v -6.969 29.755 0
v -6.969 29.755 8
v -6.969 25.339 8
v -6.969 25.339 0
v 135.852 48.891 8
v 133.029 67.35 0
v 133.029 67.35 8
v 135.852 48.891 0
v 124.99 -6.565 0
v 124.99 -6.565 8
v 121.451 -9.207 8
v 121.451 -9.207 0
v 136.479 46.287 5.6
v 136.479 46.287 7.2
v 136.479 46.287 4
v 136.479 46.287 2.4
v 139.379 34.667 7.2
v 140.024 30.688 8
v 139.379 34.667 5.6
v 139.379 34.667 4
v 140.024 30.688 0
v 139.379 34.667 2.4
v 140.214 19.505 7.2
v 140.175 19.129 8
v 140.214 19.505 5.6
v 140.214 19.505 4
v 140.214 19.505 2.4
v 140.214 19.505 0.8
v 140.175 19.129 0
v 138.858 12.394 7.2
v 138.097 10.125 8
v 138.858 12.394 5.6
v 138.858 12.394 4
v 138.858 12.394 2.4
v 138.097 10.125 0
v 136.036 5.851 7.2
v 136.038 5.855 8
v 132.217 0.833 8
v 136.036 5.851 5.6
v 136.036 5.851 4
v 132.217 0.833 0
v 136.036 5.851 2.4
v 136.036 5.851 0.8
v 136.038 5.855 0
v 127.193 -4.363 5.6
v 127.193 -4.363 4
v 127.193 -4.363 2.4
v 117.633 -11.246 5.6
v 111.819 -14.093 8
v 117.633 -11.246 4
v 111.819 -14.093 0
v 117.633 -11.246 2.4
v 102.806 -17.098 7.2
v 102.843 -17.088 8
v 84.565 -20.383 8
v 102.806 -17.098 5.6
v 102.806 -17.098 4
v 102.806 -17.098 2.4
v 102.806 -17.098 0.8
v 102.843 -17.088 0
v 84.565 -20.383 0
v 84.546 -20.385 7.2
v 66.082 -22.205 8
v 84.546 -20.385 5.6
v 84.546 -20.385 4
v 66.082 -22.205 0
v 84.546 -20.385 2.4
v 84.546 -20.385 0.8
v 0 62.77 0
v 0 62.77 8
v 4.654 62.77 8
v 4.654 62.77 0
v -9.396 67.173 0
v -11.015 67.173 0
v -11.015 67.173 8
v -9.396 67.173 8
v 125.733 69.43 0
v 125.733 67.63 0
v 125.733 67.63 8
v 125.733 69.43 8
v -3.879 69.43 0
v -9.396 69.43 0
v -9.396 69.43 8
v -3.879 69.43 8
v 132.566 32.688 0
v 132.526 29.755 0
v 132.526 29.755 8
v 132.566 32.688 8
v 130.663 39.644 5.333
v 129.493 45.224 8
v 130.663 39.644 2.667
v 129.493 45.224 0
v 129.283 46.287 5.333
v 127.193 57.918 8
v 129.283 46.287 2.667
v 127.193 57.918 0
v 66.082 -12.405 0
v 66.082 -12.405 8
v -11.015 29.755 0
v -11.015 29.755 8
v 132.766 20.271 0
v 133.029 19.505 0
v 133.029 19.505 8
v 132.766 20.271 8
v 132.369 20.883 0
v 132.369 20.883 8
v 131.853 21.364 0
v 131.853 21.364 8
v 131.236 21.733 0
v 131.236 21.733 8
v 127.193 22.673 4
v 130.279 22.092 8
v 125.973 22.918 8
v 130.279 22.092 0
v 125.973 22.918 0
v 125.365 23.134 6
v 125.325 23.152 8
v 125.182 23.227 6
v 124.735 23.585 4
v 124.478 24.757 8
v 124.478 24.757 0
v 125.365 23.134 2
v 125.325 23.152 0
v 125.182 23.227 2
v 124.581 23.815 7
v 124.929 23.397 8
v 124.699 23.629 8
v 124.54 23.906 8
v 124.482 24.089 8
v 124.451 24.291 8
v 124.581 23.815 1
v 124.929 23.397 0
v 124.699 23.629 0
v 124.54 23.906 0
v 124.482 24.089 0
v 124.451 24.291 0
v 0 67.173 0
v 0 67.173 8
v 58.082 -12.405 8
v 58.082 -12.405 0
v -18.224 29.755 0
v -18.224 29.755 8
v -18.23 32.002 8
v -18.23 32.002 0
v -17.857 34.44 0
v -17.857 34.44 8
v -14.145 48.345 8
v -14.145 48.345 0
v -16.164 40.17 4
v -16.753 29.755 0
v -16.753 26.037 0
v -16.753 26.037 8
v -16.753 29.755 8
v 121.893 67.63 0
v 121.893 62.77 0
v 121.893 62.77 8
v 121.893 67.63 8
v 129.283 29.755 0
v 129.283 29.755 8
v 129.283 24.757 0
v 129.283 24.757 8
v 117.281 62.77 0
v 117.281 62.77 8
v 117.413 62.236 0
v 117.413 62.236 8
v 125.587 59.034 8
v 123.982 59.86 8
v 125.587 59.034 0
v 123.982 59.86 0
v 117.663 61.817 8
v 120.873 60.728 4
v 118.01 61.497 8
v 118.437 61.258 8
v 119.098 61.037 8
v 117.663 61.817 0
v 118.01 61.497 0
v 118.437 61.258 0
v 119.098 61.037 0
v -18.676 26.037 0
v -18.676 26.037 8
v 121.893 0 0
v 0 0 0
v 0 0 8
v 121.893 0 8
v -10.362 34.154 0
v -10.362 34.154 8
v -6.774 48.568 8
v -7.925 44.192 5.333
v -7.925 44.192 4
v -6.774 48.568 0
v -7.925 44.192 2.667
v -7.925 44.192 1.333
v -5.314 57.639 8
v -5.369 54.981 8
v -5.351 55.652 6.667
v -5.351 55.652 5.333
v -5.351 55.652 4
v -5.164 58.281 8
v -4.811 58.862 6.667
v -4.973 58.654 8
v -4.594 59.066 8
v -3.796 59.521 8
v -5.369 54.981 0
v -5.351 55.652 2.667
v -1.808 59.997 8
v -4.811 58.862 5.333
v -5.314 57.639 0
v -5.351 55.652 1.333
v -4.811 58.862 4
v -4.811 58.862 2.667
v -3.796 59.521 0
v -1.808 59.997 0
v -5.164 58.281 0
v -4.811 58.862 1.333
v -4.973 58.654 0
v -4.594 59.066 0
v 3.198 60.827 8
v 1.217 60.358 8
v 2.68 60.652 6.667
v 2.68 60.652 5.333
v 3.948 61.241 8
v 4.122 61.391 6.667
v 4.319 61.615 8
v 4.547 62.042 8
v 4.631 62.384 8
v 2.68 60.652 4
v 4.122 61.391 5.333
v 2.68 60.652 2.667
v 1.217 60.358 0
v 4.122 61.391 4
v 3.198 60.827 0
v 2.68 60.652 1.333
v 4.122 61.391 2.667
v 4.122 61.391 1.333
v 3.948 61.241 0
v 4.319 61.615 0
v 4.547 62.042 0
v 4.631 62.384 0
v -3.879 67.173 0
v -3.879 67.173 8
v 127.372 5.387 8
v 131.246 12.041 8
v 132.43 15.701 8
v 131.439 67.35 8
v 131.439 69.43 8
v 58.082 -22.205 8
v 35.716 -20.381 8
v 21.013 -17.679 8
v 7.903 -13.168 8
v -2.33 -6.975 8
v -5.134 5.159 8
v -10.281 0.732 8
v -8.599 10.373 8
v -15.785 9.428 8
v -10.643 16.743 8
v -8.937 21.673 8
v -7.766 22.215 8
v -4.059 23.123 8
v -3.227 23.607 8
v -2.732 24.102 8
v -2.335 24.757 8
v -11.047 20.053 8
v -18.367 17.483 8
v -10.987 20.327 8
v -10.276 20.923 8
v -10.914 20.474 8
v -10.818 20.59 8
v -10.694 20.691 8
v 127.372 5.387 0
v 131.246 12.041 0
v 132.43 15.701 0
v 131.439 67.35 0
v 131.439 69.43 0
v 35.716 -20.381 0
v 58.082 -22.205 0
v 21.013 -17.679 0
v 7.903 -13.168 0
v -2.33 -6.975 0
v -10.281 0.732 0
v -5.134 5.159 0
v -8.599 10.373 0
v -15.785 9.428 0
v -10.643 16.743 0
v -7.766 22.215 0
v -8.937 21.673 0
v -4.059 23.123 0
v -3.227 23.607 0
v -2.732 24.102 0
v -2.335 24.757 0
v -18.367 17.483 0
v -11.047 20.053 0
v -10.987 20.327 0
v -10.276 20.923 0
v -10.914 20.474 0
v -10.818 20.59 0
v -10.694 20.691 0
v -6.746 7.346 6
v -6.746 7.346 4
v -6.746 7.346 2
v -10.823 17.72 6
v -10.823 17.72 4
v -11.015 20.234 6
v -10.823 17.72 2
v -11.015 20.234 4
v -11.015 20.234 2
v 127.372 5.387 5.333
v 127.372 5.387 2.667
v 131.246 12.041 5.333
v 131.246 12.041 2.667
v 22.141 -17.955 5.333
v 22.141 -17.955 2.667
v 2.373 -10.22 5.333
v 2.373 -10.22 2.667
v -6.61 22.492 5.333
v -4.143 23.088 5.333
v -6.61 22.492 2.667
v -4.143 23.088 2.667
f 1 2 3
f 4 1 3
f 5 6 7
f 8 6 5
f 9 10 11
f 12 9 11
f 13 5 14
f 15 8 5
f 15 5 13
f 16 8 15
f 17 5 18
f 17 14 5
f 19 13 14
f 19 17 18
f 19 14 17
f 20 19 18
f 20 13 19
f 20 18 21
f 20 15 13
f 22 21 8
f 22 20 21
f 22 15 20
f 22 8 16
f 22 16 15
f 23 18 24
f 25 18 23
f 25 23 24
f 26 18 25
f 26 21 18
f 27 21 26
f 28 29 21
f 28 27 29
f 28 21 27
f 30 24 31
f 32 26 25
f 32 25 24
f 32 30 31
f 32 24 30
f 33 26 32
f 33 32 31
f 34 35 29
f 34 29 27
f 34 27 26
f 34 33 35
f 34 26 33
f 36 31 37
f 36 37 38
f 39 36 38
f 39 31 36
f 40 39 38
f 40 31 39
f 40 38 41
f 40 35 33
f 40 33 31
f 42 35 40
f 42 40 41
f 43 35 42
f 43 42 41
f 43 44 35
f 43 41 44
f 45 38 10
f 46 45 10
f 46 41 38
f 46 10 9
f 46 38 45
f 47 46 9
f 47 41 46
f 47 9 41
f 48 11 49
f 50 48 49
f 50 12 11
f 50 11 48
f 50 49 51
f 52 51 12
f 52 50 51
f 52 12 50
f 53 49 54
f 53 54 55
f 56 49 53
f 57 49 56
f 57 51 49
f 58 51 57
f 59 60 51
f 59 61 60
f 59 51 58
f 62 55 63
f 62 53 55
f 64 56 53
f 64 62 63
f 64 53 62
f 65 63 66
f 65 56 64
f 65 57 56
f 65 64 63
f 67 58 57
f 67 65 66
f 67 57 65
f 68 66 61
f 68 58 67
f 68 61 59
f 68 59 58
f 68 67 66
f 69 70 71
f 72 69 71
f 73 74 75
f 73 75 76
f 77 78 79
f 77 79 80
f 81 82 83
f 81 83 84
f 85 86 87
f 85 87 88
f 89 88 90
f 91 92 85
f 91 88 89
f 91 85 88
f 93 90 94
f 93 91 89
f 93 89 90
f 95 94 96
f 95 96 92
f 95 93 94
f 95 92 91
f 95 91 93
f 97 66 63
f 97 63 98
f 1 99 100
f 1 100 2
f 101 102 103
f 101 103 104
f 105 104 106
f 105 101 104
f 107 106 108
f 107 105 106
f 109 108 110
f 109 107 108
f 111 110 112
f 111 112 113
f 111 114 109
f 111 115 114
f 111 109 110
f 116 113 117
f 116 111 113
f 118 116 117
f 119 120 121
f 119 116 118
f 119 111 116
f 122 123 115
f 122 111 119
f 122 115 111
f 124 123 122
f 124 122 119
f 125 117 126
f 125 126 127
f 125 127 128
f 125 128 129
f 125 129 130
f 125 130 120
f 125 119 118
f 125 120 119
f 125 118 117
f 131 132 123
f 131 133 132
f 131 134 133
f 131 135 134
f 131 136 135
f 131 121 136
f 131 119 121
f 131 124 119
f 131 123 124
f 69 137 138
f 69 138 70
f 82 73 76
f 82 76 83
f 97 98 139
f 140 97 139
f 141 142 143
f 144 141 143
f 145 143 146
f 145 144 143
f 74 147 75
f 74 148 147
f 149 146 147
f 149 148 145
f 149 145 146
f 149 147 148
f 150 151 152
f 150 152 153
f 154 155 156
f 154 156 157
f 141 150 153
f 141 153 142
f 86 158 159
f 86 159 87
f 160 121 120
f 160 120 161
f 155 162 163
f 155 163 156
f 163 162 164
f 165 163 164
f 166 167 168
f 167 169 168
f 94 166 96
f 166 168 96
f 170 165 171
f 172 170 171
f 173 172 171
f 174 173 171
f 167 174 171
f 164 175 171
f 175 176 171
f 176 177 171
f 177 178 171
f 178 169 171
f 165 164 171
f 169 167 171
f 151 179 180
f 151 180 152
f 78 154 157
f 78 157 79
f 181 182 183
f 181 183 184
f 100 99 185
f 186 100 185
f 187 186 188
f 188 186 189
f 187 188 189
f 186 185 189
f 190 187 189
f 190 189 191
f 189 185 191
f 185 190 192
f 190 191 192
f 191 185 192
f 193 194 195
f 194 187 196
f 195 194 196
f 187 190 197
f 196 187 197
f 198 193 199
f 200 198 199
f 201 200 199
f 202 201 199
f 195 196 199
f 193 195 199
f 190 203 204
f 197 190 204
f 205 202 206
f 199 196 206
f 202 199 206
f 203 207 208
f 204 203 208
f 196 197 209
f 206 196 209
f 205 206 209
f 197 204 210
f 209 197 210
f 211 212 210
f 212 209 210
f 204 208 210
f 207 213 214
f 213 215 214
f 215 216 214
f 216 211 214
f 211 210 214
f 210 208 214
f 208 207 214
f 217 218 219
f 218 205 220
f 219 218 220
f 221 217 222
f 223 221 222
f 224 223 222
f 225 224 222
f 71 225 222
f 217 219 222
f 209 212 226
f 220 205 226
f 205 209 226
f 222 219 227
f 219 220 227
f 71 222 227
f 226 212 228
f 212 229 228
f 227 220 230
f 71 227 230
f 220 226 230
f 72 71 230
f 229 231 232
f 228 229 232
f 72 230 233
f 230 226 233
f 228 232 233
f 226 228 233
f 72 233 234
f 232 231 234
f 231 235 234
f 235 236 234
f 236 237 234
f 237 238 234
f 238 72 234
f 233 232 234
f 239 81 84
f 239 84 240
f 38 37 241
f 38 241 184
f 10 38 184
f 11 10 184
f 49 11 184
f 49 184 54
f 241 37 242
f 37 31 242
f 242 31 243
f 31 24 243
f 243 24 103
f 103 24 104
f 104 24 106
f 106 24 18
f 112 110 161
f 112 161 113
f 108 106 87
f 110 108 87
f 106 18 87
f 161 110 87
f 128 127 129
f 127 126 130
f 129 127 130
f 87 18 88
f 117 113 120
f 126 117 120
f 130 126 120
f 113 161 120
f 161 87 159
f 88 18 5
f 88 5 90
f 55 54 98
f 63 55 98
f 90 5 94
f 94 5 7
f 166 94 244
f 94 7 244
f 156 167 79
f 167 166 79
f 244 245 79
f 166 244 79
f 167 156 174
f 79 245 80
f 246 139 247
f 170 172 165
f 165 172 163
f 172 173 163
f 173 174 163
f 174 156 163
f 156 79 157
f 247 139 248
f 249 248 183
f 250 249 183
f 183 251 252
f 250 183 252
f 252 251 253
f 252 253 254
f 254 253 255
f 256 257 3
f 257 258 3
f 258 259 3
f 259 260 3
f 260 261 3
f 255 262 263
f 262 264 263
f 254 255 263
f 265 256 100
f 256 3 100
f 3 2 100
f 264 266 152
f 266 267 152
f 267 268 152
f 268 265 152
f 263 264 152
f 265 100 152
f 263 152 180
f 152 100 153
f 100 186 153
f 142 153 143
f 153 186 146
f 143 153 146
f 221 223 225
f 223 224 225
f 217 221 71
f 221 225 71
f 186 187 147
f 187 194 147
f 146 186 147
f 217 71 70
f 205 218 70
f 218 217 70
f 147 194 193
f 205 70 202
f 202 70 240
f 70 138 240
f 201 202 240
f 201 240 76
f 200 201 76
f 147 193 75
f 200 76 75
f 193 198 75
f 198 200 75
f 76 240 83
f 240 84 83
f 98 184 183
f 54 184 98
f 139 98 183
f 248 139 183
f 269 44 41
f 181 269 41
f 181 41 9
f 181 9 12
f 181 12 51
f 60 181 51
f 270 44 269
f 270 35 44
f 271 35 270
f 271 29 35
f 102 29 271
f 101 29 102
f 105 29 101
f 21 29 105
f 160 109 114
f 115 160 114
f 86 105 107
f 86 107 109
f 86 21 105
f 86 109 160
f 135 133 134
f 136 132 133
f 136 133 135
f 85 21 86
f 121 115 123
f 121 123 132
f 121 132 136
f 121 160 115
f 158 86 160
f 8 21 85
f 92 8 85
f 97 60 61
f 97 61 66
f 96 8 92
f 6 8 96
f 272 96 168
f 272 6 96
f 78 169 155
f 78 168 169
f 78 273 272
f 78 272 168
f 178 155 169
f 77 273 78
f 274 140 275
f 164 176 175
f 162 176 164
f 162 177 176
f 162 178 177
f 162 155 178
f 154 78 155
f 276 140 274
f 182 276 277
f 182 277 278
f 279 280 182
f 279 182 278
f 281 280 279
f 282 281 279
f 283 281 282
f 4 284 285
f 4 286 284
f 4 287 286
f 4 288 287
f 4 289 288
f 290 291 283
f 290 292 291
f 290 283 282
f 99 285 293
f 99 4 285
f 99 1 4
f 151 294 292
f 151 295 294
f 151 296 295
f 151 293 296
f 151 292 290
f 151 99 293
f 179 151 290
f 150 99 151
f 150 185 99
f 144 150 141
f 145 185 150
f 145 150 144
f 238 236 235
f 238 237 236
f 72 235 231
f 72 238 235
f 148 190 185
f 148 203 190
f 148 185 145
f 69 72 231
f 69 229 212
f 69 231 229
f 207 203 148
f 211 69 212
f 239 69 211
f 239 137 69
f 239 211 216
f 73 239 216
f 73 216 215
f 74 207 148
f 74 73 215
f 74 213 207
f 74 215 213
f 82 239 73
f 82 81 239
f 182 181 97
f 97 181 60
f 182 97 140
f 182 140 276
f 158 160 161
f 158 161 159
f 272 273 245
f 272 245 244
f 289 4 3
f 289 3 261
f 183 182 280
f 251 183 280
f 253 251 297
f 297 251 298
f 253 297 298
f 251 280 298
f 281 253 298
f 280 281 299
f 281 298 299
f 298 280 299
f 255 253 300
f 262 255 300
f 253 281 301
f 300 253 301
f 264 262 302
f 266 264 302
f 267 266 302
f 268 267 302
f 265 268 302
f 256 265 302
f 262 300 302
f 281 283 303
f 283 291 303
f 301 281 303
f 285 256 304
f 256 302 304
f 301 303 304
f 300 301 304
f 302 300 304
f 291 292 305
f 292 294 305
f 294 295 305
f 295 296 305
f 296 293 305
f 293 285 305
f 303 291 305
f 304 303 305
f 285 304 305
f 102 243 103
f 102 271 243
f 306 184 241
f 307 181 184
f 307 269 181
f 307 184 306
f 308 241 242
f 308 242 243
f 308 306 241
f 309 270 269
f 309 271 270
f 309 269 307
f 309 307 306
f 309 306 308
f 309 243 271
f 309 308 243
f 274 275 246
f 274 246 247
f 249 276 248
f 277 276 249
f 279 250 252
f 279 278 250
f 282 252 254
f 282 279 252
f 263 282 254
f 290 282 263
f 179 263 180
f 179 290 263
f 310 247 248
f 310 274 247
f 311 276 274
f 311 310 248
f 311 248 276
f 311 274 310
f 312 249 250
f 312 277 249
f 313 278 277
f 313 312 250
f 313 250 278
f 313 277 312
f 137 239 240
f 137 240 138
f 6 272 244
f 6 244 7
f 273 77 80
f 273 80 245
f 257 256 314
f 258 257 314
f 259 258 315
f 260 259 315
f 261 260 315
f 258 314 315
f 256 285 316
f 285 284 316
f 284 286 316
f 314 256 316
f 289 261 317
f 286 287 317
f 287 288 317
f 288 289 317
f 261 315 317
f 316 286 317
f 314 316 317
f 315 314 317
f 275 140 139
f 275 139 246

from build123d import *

# Parameters (mm, degrees)
EXTRUDE_1_DEPTH = 8


with BuildPart() as part:
    # 草图1 → 凸台-拉伸1 (new body)
    with BuildSketch(Plane.XY):
        with BuildLine():
            Line((0, 0), (121.892861676, 0))
            add(Edge.make_bspline(
                [(121.892861676, 0), (128.011971759, 4.601847517), (132.454502989, 11.788264632), (133.029184064, 19.505419747)],
                knots=[0, 0, 0, 0, 1, 1, 1, 1], degree=3))
            add(Edge.make_bspline(
                [(133.029184064, 19.505419747), (132.457883714, 22.04064129), (128.499225032, 22.345623299), (124.207815264, 23.217726577), (124.477695415, 24.757235523)],
                knots=[0, 0, 0, 0, 0.647423509, 1, 1, 1, 1], degree=3))
            Line((124.477695415, 24.757235523), (129.282930216, 24.757235523))
            Line((129.282930216, 24.757235523), (129.282930216, 29.75529488))
            Line((129.282930216, 29.75529488), (132.52615532, 29.75529488))
            add(Edge.make_bspline(
                [(132.52615532, 29.75529488), (133.109490058, 33.210504162), (130.53602349, 38.484222169), (129.182889891, 47.977798132), (127.274263485, 53.926700452), (127.192551314, 57.918432039)],
                knots=[0, 0, 0, 0, 0.352752785, 0.588696291, 1, 1, 1, 1], degree=3))
            add(Edge.make_bspline(
                [(117.280649471, 62.770146705), (117.475578993, 61.067706228), (122.209472834, 60.844278135), (125.144669848, 59.506949815), (127.192551314, 57.918432039)],
                knots=[0, 0, 0, 0, 0.387326309, 1, 1, 1, 1], degree=3))
            Line((117.280649471, 62.770146705), (121.892861676, 62.770146705))
            Line((121.892861676, 62.770146705), (121.892861676, 67.630194554))
            Line((121.892861676, 67.630194554), (125.7329066, 67.630194554))
            Line((125.7329066, 67.630194554), (125.7329066, 69.430400533))
            Line((125.7329066, 69.430400533), (131.438583204, 69.430400533))
            Line((131.438583204, 69.430400533), (131.438583204, 67.349539011))
            Line((131.438583204, 67.349539011), (133.029184064, 67.349539011))
            add(Edge.make_bspline(
                [(133.029184064, 67.349539011), (133.564901877, 60.247640999), (135.398192236, 49.245837259), (140.067666181, 33.723017907), (141.072006263, 19.819633097), (137.281476009, 5.343447435), (129.144560539, -2.25807561), (123.308303206, -8.431939681), (118.303600061, -10.858215118), (111.587418972, -14.456377453), (94.638037984, -20.019085561), (78.348366705, -21.008095209), (66.081887238, -22.204999352)],
                knots=[0, 0, 0, 0, 0.151237516, 0.236030191, 0.343538784, 0.444639981, 0.540293436, 0.575127263, 0.624226885, 0.656634372, 0.737279491, 1, 1, 1, 1], degree=3))
            Line((66.081887238, -22.204999352), (66.081887238, -12.404999352))
            Line((66.081887238, -12.404999352), (58.081887238, -12.404999352))
            Line((58.081887238, -12.404999352), (58.081887238, -22.204999352))
            add(Edge.make_bspline(
                [(58.081887238, -22.204999352), (46.068539701, -21.533775573), (26.7497211, -20.30053767), (-5.278411143, -9.189041191), (-20.324962842, 11.117665055), (-18.676297456, 26.036873145)],
                knots=[0, 0, 0, 0, 0.358876997, 0.569204983, 1, 1, 1, 1], degree=3))
            Line((-18.676297456, 26.036873145), (-16.752549329, 26.036873145))
            Line((-16.752549329, 26.036873145), (-16.752549329, 29.75529488))
            Line((-16.752549329, 29.75529488), (-18.223761048, 29.75529488))
            add(Edge.make_bspline(
                [(-18.223761048, 29.75529488), (-18.550546612, 33.449005635), (-13.7568902, 45.343133946), (-12.698829405, 58.21833283), (-11.014823623, 67.172575691)],
                knots=[0, 0, 0, 0, 0.279320488, 1, 1, 1, 1], degree=3))
            Line((-11.014823623, 67.172575691), (-9.396490731, 67.172575691))
            Line((-9.396490731, 67.172575691), (-9.396490731, 69.430400533))
            Line((-9.396490731, 69.430400533), (-3.879446783, 69.430400533))
            Line((-3.879446783, 69.430400533), (-3.879446783, 67.172575691))
            Line((-3.879446783, 67.172575691), (0, 67.172575691))
            Line((0, 67.172575691), (0, 62.770146705))
            Line((0, 62.770146705), (4.653581191, 62.770146705))
            add(Edge.make_bspline(
                [(-11.014823623, 29.75529488), (-11.09421657, 33.214563813), (-8.761277836, 37.759074692), (-8.084448244, 43.958305118), (-6.637070836, 49.261588362), (-5.048833168, 53.684470609), (-5.855262578, 61.815388525), (4.751990819, 59.02668145), (4.653581191, 62.770146705)],
                knots=[0, 0, 0, 0, 0.254341408, 0.369747983, 0.46600371, 0.663215063, 0.735184517, 1, 1, 1, 1], degree=3))
            Line((-11.014823623, 29.75529488), (-6.968991394, 29.75529488))
            Line((-6.968991394, 29.75529488), (-6.968991394, 25.338593411))
            Line((-6.968991394, 25.338593411), (-2.334674477, 24.757235523))
            add(Edge.make_bspline(
                [(-8.936877173, 21.67310046), (-6.944961427, 23.034723325), (-3.548495224, 22.119347239), (-2.334674477, 24.757235523)],
                knots=[0, 0, 0, 0, 1, 1, 1, 1], degree=3))
            add(Edge.make_bspline(
                [(0, 0), (-2.706760816, 1.985528057), (-7.907697304, 8.455845135), (-10.137815695, 13.053738583), (-11.328269229, 20.904647303), (-10.329171157, 20.762958158), (-8.936877173, 21.67310046)],
                knots=[0, 0, 0, 0, 0.369244443, 0.820134238, 0.903851561, 1, 1, 1, 1], degree=3))
        make_face()
    extrude(amount=EXTRUDE_1_DEPTH)


solid = part.part
